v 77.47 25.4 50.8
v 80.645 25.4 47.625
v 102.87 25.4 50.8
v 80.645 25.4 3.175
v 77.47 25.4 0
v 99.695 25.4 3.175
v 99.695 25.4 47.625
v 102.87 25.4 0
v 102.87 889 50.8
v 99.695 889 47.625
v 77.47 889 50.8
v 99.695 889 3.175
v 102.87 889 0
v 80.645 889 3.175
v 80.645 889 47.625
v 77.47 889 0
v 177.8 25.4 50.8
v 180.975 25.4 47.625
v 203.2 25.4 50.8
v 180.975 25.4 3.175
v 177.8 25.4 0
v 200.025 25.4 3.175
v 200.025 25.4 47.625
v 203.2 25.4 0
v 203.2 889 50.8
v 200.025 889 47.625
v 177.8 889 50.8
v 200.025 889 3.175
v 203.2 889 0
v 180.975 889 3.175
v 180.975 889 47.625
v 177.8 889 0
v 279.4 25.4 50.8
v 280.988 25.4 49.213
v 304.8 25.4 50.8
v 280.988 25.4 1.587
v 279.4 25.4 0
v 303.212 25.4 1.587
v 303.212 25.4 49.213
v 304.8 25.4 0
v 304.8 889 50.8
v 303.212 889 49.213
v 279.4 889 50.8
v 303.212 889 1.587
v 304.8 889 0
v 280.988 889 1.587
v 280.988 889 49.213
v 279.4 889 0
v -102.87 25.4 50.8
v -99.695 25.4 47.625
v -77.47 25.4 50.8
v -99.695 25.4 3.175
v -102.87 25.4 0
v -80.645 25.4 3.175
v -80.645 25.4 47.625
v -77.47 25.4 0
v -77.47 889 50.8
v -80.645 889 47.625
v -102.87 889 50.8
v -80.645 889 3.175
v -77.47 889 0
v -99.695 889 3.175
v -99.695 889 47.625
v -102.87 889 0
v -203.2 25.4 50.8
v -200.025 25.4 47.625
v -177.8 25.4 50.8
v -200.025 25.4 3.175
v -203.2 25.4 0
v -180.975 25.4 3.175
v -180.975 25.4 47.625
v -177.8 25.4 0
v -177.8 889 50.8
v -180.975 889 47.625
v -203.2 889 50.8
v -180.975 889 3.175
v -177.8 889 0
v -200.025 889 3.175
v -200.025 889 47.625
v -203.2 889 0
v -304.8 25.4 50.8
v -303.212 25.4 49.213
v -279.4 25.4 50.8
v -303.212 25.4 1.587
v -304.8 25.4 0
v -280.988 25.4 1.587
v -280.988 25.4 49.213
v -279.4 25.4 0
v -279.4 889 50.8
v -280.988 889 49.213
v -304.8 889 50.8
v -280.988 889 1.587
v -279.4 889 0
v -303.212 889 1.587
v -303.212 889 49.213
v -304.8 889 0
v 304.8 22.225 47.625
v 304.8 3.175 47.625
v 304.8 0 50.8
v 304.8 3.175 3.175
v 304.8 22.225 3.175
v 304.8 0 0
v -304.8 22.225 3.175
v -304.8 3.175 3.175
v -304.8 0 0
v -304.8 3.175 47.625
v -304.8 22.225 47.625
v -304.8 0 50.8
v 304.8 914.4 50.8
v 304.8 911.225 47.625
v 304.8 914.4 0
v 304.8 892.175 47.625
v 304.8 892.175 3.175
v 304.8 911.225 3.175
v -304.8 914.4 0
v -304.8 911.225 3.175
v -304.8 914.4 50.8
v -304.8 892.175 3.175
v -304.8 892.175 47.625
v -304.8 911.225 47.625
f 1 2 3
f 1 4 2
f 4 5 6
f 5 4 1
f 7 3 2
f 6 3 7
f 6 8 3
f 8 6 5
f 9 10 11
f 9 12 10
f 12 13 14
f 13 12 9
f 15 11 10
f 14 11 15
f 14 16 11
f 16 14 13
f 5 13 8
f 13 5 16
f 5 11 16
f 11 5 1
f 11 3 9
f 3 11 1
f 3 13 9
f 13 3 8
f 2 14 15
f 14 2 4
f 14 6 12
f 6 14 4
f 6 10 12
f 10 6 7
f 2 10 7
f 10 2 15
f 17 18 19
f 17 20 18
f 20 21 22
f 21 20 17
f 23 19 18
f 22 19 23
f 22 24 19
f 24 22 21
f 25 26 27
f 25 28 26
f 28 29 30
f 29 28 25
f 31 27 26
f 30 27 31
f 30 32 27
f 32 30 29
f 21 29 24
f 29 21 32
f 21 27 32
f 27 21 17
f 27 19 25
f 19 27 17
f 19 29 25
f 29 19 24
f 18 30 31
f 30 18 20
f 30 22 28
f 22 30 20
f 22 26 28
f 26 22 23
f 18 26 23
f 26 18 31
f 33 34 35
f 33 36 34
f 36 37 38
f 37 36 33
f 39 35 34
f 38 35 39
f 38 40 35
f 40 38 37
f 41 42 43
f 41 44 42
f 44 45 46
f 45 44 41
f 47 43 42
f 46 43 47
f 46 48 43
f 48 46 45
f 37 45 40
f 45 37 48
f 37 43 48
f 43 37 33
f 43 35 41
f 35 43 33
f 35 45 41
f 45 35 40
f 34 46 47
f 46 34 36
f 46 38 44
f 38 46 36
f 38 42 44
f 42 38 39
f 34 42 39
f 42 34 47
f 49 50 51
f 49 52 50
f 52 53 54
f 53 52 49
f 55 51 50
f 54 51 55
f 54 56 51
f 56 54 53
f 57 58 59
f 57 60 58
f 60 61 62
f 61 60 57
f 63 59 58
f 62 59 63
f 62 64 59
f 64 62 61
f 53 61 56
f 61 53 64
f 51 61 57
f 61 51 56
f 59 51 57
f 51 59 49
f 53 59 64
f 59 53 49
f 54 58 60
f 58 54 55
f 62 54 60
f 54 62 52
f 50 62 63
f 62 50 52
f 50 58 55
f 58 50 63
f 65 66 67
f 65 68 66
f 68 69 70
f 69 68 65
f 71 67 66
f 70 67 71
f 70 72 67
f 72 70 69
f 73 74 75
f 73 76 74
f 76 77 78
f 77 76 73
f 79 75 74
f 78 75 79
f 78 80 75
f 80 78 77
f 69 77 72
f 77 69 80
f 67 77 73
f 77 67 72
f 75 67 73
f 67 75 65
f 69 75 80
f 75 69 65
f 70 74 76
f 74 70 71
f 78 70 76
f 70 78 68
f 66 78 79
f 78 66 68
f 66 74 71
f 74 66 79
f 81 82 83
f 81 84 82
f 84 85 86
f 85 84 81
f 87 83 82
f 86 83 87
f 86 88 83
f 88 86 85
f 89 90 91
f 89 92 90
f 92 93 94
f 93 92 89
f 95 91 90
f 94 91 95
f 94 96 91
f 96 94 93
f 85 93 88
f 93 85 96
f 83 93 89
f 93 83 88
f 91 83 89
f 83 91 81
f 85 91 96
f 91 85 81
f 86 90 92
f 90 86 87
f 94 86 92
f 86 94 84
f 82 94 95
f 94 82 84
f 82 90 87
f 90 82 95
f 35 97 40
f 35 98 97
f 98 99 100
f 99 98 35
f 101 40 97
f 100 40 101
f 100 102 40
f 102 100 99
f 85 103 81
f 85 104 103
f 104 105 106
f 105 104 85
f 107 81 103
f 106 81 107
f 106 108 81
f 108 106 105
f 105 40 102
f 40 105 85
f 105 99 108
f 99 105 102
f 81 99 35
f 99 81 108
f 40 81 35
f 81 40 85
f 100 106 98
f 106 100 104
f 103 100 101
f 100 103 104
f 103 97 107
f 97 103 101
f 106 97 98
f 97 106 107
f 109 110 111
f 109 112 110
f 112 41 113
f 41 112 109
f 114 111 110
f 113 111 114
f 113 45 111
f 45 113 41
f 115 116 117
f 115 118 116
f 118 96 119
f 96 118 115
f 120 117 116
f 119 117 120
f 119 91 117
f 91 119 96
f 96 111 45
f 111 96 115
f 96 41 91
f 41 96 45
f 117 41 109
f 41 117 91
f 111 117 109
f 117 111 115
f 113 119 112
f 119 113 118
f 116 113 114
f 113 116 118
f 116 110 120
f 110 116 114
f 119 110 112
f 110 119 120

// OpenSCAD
include <MCAD/constants.scad>
//Measurements in inches and auto-converted to MM

//Configurable variables
$chassisLength   =   36 * mm_per_inch;
$chassisWidth    =   24 * mm_per_inch;
$drivetrainWidth =	 14 * mm_per_inch;

//Constants
$extH            =   2 * mm_per_inch;
$extW            =   1 * mm_per_inch;
$thickExtWall    =   0.125 * mm_per_inch;
$thinExtWall     =   0.0625 * mm_per_inch;
$batteryL		 =   7.1 * mm_per_inch;
$batteryW		 =	 3.0 * mm_per_inch;
$batteryH		 =	 6.58 * mm_per_inch;

$perimeter = $chassisLength*2 + $chassisWidth*2;
assert($perimeter <= 120 * mm_per_inch, "Chassis is over FRC perimeter limit!");

module End(){
	translate([$chassisWidth/2, $extW/2, $extH/2])
	rotate([-90, 0, 90])
        linear_extrude(height = $chassisWidth)
        difference(){
            square([$extW, $extH], center = true);
            square([$extW - $thickExtWall*2, $extH - $thickExtWall*2], center = true);
        }
}

//Defines the rails on the right half of the bots chassis
module RSide(){
    //innermost rail
    translate([$batteryL/2, $extW, $extH/2])
        rotate([-90, 0, 0])
        linear_extrude(height = $chassisLength - $extW*2)
        difference(){
            square([$extW, $extH], center = true);
            square([$extW - $thickExtWall*2, $extH - $thickExtWall*2], center = true);
        }
    //drivetrain mount rail
    translate([$drivetrainWidth/2+$extW/2, $extW, $extH/2])
        rotate([-90, 0, 0])
        linear_extrude(height = $chassisLength - $extW*2)
        difference(){
            square([$extW, $extH], center = true);
            square([$extW - $thickExtWall*2, $extH - $thickExtWall*2], center = true);
        }
    //outermost rail
    translate([$chassisWidth/2-$extW/2, $extW, $extH/2])
        rotate([-90, 0, 0])
        linear_extrude(height = $chassisLength - $extW*2)
        difference(){
            square([$extW, $extH], center = true);
            square([$extW - $thinExtWall*2, $extH - $thinExtWall*2], center = true);
        }
}


//Call the RSide module to be generated.
RSide();
//Call the RSide module but mirrored on the x axis to make the LSide
mirror([1,0,0])
    RSide();
//Call the End module to be generated
End();
//Call another End module but move it to the opposite side of the chassis
translate([0,$chassisLength-$extW,0])
	End();
